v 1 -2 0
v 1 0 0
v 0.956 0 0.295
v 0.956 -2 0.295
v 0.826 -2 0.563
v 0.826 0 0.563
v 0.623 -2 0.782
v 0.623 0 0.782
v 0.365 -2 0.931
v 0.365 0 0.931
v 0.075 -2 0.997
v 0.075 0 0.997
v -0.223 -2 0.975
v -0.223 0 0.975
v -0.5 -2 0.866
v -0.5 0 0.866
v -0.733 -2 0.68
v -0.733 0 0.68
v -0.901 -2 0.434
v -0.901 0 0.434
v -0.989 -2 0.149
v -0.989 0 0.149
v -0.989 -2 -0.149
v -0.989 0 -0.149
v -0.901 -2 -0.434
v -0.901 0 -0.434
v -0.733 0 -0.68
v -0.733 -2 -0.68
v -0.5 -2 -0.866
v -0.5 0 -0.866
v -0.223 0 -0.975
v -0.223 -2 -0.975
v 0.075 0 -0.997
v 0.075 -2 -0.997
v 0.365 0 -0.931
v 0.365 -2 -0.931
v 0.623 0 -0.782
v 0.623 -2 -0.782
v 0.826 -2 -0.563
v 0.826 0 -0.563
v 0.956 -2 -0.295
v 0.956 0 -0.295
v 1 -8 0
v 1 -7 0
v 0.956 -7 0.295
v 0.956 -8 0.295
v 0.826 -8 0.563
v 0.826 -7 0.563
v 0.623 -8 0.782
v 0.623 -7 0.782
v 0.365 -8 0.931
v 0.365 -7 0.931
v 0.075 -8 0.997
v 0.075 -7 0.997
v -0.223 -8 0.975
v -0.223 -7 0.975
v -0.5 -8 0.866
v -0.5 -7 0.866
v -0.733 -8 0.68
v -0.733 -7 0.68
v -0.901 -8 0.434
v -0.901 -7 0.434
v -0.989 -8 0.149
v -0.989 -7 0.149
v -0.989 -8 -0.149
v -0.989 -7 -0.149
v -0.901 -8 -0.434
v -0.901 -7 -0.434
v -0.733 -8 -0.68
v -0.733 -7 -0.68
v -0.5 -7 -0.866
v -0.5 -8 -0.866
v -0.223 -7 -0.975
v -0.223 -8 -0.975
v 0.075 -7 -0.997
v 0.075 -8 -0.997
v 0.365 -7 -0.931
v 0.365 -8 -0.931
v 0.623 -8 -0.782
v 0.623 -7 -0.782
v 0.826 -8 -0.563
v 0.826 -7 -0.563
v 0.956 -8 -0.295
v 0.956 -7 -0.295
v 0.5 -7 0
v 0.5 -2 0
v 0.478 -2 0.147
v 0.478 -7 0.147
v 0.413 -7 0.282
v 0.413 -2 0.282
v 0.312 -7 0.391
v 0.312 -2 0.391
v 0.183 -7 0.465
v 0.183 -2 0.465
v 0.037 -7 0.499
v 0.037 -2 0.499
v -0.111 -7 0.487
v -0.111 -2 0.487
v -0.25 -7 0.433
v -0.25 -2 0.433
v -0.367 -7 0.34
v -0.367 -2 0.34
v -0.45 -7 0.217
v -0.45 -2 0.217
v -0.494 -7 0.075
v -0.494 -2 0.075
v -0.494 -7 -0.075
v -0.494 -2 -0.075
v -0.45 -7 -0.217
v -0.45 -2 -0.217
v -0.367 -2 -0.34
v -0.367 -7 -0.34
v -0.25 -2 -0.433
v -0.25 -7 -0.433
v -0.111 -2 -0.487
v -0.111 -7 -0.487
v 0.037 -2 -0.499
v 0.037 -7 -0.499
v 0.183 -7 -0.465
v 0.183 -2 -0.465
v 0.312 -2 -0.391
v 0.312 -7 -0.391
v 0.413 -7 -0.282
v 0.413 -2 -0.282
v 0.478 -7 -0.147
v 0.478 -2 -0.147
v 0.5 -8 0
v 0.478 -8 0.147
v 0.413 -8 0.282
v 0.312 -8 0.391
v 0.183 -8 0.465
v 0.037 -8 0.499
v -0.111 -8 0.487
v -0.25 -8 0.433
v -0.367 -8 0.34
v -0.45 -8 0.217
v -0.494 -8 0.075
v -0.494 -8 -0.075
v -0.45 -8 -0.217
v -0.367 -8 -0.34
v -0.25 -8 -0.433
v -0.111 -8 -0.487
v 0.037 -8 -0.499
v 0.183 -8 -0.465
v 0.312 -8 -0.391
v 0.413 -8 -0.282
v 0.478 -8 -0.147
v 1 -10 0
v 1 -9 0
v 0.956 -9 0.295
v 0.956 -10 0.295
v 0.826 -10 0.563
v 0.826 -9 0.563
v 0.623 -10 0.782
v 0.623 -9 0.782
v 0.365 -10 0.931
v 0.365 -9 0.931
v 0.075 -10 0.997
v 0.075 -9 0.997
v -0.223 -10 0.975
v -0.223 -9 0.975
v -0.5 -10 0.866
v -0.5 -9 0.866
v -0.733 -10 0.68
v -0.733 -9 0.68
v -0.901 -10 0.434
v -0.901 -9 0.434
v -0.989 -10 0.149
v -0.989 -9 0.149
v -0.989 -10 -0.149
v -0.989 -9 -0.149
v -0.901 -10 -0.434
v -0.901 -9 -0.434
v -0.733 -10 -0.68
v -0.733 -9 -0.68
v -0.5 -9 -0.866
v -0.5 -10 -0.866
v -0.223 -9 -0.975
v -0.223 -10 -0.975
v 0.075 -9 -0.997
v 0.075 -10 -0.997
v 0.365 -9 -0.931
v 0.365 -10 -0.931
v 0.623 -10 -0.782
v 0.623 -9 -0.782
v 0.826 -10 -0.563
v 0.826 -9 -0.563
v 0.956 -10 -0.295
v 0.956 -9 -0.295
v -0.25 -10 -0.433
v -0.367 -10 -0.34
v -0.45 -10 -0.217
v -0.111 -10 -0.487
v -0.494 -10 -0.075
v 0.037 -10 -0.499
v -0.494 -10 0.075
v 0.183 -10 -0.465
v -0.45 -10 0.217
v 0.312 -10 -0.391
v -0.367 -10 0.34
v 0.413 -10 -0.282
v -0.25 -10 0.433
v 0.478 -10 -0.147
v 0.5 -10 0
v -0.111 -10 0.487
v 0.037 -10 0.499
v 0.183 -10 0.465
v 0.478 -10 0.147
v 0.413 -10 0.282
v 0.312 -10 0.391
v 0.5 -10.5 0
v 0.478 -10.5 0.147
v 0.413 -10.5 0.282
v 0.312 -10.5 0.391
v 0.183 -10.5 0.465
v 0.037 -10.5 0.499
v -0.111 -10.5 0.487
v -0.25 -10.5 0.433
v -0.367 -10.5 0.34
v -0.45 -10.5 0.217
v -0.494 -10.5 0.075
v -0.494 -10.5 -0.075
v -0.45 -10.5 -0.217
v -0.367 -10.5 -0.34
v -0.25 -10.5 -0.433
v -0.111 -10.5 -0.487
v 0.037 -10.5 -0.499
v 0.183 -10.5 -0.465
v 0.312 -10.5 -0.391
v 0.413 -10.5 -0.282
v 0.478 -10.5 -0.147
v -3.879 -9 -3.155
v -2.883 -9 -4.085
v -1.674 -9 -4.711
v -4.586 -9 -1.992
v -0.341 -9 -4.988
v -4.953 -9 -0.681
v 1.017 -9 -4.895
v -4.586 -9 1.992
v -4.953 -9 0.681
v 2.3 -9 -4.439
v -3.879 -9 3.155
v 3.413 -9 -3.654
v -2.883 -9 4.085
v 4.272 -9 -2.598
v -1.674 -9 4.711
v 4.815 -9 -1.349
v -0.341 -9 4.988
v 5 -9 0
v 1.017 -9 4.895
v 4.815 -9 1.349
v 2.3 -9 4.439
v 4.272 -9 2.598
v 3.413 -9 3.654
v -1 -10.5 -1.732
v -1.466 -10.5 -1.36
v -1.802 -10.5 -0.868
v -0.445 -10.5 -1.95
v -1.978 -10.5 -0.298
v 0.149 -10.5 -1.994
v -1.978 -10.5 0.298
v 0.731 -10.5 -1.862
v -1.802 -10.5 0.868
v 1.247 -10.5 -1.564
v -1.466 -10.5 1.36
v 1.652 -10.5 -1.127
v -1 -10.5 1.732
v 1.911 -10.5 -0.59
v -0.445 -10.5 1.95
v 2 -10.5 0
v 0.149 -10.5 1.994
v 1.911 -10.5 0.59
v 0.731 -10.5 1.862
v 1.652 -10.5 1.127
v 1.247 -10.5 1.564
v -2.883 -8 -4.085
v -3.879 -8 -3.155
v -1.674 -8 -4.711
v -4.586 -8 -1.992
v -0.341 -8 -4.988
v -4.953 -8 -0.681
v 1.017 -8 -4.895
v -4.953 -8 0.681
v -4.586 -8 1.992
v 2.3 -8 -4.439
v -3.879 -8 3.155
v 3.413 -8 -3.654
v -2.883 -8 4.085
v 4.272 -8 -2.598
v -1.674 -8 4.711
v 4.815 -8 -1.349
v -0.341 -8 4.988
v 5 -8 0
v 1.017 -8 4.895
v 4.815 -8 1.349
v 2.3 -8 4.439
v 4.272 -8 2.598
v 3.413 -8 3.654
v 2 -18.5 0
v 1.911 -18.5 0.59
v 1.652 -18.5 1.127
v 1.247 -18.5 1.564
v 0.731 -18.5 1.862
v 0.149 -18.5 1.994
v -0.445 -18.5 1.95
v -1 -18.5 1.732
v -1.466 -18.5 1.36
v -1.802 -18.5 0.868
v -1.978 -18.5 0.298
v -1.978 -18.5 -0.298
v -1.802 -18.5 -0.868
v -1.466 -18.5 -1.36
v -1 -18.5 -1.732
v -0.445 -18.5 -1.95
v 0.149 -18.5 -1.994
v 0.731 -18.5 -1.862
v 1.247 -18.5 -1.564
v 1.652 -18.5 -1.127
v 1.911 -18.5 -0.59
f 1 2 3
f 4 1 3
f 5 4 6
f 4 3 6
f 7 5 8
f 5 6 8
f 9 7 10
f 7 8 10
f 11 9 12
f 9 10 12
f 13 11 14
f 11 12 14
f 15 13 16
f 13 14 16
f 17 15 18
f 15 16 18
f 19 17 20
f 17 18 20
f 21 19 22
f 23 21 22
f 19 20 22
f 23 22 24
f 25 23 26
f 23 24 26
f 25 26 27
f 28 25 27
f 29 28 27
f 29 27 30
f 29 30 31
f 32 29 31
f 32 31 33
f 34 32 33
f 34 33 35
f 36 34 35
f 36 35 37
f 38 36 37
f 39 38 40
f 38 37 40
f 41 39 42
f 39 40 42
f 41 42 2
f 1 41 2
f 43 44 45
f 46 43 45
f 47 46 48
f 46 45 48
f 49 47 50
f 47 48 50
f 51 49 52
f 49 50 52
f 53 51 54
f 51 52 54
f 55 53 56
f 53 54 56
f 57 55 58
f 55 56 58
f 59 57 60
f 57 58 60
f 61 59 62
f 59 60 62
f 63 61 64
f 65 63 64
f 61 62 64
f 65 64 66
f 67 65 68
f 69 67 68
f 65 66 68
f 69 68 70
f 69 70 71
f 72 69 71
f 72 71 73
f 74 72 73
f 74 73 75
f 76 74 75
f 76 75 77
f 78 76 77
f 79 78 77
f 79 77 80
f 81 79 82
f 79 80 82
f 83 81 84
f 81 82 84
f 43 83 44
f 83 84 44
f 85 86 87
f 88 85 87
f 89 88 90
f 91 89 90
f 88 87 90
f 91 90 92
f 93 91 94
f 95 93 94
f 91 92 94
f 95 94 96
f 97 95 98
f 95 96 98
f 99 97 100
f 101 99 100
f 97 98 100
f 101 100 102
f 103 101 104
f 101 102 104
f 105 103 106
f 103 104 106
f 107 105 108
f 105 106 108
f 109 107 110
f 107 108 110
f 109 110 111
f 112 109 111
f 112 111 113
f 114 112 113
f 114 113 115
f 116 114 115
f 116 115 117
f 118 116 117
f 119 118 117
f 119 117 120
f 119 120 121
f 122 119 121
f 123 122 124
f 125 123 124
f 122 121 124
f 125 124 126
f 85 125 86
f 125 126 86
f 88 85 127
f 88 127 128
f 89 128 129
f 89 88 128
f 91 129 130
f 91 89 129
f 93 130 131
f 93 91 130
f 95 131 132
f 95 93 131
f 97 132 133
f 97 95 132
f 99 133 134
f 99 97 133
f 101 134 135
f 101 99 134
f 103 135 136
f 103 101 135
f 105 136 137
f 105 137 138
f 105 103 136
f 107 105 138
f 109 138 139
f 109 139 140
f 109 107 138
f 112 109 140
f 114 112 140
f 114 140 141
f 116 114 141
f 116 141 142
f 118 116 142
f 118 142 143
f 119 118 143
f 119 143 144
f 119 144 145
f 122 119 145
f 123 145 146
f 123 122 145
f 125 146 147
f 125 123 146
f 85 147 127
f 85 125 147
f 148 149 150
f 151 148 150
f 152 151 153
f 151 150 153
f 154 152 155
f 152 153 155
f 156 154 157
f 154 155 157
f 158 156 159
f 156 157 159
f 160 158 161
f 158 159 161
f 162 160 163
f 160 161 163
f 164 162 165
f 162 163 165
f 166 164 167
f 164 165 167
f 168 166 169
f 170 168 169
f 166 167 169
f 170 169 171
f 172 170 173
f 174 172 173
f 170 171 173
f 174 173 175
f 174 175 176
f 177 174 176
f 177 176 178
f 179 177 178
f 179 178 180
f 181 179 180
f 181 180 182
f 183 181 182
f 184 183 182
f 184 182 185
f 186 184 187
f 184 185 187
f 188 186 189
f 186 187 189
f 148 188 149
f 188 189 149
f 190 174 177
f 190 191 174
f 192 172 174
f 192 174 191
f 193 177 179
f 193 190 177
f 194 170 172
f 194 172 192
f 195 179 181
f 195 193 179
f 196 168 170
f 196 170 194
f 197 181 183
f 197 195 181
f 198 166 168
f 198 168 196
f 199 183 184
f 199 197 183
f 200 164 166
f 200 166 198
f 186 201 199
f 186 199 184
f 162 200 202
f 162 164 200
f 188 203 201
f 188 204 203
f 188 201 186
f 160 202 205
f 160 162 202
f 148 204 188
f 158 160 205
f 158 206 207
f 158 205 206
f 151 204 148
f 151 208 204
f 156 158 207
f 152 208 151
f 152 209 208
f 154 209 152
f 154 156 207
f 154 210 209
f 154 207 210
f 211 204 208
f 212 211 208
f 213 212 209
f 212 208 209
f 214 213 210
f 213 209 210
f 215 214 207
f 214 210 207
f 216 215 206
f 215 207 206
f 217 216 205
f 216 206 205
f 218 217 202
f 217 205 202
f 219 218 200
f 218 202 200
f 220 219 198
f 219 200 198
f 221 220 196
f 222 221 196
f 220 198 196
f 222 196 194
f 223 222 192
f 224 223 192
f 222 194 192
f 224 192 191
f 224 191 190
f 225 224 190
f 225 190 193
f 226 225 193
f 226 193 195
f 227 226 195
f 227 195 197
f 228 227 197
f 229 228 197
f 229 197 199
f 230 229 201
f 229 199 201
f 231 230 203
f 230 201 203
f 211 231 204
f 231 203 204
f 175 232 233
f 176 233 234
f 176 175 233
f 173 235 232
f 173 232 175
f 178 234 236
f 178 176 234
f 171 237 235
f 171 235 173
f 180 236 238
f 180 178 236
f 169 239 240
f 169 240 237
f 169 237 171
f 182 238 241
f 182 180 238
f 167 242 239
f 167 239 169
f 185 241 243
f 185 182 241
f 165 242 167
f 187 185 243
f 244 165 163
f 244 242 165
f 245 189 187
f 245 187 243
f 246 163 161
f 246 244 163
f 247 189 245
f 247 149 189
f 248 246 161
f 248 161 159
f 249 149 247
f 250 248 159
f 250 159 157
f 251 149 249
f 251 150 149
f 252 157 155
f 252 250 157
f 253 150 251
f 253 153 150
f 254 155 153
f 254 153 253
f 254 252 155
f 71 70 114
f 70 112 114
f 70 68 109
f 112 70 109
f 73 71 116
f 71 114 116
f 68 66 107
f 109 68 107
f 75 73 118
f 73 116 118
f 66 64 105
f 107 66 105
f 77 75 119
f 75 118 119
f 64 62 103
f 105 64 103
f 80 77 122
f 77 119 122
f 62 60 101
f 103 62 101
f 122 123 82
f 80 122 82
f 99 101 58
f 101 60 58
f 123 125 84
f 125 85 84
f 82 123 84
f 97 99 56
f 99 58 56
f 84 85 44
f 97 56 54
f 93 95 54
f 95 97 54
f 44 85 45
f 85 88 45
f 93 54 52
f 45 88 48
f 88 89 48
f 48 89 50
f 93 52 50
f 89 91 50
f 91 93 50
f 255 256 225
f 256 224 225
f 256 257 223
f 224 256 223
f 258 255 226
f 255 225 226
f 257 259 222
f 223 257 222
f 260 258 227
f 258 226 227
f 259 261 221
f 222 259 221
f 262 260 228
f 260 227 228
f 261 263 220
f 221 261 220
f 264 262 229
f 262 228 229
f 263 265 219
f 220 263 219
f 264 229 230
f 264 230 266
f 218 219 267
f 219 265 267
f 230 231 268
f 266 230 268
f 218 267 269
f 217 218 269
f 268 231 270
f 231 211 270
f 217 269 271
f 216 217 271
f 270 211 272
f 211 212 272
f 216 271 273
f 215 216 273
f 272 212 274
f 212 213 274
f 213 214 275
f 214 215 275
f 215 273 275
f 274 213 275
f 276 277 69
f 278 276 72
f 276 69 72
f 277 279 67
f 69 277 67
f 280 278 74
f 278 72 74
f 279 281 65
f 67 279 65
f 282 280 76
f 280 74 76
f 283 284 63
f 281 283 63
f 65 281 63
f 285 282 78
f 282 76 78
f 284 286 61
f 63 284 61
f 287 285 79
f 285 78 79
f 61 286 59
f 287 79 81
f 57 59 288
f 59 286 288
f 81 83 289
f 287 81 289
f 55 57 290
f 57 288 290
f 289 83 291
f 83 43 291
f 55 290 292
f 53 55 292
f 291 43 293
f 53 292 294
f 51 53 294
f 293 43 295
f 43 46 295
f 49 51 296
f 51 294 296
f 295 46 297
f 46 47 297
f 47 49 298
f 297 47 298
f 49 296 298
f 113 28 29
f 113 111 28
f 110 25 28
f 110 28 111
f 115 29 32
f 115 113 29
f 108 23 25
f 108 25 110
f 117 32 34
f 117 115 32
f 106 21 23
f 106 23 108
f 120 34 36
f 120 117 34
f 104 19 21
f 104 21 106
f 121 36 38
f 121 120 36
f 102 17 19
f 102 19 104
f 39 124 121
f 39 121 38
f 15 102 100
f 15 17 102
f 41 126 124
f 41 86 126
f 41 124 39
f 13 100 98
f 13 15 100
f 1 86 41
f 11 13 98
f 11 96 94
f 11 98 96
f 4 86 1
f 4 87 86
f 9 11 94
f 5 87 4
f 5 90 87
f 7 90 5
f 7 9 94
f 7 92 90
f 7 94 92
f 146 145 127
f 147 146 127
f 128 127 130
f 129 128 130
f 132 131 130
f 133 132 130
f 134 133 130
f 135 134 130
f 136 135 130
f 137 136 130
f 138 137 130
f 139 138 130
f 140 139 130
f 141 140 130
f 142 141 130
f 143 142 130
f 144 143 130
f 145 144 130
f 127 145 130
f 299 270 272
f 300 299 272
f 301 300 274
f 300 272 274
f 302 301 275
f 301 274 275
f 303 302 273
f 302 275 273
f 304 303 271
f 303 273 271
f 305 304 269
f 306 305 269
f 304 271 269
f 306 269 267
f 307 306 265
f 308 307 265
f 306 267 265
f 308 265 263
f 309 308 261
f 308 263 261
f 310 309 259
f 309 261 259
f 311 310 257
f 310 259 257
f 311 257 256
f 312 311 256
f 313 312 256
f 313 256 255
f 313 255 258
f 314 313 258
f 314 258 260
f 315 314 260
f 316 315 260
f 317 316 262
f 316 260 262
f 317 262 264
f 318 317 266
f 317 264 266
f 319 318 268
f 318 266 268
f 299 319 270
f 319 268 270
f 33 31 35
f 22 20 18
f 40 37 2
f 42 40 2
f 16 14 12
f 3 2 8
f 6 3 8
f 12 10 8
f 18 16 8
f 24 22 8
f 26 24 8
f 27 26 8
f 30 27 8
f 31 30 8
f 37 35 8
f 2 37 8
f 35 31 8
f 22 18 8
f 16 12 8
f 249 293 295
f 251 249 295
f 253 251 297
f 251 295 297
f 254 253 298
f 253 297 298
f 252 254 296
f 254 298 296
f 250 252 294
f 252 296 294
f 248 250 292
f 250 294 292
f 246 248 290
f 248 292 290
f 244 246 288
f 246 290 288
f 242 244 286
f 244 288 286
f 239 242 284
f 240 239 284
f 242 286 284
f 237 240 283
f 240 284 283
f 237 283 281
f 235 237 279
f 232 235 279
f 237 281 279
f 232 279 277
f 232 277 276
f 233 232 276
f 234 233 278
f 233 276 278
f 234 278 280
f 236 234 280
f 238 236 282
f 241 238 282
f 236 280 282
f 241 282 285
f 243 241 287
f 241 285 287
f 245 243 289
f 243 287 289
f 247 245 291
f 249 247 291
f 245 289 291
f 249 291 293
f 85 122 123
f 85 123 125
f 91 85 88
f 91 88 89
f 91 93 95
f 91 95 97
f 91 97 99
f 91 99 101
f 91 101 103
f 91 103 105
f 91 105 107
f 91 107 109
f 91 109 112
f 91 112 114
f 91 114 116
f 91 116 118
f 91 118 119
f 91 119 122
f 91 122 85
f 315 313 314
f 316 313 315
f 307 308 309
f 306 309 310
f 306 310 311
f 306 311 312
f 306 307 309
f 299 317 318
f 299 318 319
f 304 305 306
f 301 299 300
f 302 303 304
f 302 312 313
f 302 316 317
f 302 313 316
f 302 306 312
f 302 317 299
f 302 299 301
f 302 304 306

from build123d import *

# Parameters (mm, degrees)
F0_R      = 1
F1_DEPTH  = 2
F2_R      = 0.5
F3_DEPTH  = 5
F4_R      = 1
F4_R_2    = 0.5
F5_DEPTH  = 1
F6_R      = 5
F7_DEPTH  = 1
F8_R      = 1
F9_DEPTH  = 1
F10_R     = 0.5
F11_DEPTH = 0.5
F12_R     = 2
F13_DEPTH = 8


with BuildPart() as f1:
    # F0 (on Front) → F1 (new body)
    with BuildSketch(Plane.XZ):
        Circle(F0_R)
    extrude(amount=F1_DEPTH)

    # F2 (on face) → F3 (join)
    with BuildSketch(Plane.XZ.offset(2)):
        Circle(F2_R)
    extrude(amount=F3_DEPTH)


with BuildPart() as f5:
    # F4 (on face) → F5 (new body)
    with BuildSketch(Plane.XZ.offset(7)):
        Circle(F4_R)
        Circle(F4_R_2, mode=Mode.SUBTRACT)
    extrude(amount=F5_DEPTH)

    # F6 (on face) → F7 (join)
    with BuildSketch(Plane.XZ.offset(8)):
        Circle(F6_R)
    extrude(amount=F7_DEPTH)

    # F8 (on face) → F9 (join)
    with BuildSketch(Plane.XZ.offset(9)):
        Circle(F8_R)
    extrude(amount=F9_DEPTH)

    # F10 (on face) → F11 (join)
    with BuildSketch(Plane.XZ.offset(10)):
        Circle(F10_R)
    extrude(amount=F11_DEPTH)

    # F12 (on face) → F13 (join)
    with BuildSketch(Plane.XZ.offset(10.5)):
        Circle(F12_R)
    extrude(amount=F13_DEPTH)


solid = Compound([f1.part, f5.part])
